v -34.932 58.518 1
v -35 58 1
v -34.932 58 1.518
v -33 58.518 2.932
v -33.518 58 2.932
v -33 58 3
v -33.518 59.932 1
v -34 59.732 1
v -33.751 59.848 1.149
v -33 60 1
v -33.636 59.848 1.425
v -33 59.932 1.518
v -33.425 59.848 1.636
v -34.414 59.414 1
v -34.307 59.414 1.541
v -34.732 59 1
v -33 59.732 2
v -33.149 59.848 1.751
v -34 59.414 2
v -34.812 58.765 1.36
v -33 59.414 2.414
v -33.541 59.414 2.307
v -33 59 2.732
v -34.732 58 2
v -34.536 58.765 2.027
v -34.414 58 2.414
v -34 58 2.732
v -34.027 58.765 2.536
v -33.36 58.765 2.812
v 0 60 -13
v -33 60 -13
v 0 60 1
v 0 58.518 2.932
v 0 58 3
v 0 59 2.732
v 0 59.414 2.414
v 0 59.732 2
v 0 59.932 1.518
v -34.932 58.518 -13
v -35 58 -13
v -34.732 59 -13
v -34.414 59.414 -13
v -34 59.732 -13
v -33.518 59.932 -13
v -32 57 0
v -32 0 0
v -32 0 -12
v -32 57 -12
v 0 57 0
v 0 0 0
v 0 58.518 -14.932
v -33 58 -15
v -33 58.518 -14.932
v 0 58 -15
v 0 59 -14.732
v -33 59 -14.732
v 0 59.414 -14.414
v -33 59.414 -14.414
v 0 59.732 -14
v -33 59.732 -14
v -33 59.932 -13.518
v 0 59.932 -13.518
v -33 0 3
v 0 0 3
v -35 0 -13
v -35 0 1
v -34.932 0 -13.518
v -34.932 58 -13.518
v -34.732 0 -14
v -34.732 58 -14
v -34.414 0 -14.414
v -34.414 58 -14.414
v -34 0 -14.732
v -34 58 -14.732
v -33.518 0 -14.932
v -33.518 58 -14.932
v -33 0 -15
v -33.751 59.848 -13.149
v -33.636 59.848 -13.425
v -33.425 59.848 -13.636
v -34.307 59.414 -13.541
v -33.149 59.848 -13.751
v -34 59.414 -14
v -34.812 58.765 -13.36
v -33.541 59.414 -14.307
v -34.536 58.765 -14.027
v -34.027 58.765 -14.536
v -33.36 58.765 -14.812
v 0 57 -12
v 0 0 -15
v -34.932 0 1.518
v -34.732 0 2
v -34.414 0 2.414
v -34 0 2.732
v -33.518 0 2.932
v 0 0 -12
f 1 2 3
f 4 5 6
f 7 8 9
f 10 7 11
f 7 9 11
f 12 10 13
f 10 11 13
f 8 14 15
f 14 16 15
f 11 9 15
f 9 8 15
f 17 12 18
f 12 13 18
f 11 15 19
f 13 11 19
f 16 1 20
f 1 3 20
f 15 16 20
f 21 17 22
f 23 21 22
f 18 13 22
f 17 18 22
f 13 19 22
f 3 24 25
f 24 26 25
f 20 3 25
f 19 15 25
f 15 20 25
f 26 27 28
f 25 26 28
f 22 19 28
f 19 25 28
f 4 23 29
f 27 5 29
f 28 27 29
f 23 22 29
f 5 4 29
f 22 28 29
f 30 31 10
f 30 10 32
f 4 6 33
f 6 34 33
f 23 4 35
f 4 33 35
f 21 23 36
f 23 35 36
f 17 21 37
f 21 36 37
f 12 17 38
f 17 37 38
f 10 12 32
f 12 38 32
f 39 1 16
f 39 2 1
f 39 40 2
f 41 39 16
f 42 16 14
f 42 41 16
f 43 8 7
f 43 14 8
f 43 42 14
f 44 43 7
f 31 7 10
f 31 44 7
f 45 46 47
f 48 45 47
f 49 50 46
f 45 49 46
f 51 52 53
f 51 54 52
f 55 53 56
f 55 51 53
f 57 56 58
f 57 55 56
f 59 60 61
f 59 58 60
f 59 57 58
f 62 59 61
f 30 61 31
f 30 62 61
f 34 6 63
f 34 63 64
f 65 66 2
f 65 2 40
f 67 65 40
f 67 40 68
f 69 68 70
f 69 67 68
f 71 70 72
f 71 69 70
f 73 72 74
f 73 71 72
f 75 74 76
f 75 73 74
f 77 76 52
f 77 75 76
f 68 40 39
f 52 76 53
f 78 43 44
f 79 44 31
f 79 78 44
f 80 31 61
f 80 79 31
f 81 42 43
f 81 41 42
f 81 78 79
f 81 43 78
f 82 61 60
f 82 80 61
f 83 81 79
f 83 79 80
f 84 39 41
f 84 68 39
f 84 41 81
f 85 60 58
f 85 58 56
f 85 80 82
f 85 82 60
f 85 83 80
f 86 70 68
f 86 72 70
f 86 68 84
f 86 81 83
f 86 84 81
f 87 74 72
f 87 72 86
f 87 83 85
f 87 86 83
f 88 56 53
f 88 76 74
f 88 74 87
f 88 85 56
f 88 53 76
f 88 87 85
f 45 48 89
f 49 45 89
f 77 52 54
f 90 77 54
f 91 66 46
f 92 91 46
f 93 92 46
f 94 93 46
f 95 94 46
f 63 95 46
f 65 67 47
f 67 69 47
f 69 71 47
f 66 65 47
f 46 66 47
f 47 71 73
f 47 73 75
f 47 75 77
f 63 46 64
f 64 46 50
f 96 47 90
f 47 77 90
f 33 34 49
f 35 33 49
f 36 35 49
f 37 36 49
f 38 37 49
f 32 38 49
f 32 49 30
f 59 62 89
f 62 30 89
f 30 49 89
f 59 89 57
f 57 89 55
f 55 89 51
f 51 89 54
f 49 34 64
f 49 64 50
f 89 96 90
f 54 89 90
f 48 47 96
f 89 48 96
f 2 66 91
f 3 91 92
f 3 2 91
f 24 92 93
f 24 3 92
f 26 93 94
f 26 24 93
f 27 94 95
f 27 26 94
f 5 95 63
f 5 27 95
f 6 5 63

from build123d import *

# Parameters (mm, degrees)
BOSS_EXTRUDE1_DEPTH = 57
SKETCH2_W           = 35
SKETCH2_H           = 18
BOSS_EXTRUDE2_DEPTH = 3
FILLET1_R           = 2


with BuildPart() as part:
    # Sketch1 → Boss-Extrude1 (new body)
    with BuildSketch(Plane(origin=(0, 0, 0), x_dir=(1, 0, 0), z_dir=(0, 1, 0))):
        Polygon((0, 0), (-32, 0), (-32, 12), (0, 12), (0, 15), (-35, 15), (-35, -3), (0, -3), align=None)
    extrude(amount=BOSS_EXTRUDE1_DEPTH)

    # Sketch2 → Boss-Extrude2 (add)
    with BuildSketch(Plane(origin=(0, 57, 0), x_dir=(1, 0, 0), z_dir=(0, 1, 0))):
        with Locations((-17.5, 6)):
            Rectangle(SKETCH2_W, SKETCH2_H)
    extrude(amount=BOSS_EXTRUDE2_DEPTH)

    # Fillet1
    fillet1_edges = [part.edges().sort_by_distance(p)[0] for p in [
        (-35, 30, 3),
        (-35, 30, -15),
        (-35, 60, -6),
        (-17.5, 60, 3),
        (-17.5, 60, -15),
    ]]
    fillet(fillet1_edges, radius=FILLET1_R)


solid = part.part
